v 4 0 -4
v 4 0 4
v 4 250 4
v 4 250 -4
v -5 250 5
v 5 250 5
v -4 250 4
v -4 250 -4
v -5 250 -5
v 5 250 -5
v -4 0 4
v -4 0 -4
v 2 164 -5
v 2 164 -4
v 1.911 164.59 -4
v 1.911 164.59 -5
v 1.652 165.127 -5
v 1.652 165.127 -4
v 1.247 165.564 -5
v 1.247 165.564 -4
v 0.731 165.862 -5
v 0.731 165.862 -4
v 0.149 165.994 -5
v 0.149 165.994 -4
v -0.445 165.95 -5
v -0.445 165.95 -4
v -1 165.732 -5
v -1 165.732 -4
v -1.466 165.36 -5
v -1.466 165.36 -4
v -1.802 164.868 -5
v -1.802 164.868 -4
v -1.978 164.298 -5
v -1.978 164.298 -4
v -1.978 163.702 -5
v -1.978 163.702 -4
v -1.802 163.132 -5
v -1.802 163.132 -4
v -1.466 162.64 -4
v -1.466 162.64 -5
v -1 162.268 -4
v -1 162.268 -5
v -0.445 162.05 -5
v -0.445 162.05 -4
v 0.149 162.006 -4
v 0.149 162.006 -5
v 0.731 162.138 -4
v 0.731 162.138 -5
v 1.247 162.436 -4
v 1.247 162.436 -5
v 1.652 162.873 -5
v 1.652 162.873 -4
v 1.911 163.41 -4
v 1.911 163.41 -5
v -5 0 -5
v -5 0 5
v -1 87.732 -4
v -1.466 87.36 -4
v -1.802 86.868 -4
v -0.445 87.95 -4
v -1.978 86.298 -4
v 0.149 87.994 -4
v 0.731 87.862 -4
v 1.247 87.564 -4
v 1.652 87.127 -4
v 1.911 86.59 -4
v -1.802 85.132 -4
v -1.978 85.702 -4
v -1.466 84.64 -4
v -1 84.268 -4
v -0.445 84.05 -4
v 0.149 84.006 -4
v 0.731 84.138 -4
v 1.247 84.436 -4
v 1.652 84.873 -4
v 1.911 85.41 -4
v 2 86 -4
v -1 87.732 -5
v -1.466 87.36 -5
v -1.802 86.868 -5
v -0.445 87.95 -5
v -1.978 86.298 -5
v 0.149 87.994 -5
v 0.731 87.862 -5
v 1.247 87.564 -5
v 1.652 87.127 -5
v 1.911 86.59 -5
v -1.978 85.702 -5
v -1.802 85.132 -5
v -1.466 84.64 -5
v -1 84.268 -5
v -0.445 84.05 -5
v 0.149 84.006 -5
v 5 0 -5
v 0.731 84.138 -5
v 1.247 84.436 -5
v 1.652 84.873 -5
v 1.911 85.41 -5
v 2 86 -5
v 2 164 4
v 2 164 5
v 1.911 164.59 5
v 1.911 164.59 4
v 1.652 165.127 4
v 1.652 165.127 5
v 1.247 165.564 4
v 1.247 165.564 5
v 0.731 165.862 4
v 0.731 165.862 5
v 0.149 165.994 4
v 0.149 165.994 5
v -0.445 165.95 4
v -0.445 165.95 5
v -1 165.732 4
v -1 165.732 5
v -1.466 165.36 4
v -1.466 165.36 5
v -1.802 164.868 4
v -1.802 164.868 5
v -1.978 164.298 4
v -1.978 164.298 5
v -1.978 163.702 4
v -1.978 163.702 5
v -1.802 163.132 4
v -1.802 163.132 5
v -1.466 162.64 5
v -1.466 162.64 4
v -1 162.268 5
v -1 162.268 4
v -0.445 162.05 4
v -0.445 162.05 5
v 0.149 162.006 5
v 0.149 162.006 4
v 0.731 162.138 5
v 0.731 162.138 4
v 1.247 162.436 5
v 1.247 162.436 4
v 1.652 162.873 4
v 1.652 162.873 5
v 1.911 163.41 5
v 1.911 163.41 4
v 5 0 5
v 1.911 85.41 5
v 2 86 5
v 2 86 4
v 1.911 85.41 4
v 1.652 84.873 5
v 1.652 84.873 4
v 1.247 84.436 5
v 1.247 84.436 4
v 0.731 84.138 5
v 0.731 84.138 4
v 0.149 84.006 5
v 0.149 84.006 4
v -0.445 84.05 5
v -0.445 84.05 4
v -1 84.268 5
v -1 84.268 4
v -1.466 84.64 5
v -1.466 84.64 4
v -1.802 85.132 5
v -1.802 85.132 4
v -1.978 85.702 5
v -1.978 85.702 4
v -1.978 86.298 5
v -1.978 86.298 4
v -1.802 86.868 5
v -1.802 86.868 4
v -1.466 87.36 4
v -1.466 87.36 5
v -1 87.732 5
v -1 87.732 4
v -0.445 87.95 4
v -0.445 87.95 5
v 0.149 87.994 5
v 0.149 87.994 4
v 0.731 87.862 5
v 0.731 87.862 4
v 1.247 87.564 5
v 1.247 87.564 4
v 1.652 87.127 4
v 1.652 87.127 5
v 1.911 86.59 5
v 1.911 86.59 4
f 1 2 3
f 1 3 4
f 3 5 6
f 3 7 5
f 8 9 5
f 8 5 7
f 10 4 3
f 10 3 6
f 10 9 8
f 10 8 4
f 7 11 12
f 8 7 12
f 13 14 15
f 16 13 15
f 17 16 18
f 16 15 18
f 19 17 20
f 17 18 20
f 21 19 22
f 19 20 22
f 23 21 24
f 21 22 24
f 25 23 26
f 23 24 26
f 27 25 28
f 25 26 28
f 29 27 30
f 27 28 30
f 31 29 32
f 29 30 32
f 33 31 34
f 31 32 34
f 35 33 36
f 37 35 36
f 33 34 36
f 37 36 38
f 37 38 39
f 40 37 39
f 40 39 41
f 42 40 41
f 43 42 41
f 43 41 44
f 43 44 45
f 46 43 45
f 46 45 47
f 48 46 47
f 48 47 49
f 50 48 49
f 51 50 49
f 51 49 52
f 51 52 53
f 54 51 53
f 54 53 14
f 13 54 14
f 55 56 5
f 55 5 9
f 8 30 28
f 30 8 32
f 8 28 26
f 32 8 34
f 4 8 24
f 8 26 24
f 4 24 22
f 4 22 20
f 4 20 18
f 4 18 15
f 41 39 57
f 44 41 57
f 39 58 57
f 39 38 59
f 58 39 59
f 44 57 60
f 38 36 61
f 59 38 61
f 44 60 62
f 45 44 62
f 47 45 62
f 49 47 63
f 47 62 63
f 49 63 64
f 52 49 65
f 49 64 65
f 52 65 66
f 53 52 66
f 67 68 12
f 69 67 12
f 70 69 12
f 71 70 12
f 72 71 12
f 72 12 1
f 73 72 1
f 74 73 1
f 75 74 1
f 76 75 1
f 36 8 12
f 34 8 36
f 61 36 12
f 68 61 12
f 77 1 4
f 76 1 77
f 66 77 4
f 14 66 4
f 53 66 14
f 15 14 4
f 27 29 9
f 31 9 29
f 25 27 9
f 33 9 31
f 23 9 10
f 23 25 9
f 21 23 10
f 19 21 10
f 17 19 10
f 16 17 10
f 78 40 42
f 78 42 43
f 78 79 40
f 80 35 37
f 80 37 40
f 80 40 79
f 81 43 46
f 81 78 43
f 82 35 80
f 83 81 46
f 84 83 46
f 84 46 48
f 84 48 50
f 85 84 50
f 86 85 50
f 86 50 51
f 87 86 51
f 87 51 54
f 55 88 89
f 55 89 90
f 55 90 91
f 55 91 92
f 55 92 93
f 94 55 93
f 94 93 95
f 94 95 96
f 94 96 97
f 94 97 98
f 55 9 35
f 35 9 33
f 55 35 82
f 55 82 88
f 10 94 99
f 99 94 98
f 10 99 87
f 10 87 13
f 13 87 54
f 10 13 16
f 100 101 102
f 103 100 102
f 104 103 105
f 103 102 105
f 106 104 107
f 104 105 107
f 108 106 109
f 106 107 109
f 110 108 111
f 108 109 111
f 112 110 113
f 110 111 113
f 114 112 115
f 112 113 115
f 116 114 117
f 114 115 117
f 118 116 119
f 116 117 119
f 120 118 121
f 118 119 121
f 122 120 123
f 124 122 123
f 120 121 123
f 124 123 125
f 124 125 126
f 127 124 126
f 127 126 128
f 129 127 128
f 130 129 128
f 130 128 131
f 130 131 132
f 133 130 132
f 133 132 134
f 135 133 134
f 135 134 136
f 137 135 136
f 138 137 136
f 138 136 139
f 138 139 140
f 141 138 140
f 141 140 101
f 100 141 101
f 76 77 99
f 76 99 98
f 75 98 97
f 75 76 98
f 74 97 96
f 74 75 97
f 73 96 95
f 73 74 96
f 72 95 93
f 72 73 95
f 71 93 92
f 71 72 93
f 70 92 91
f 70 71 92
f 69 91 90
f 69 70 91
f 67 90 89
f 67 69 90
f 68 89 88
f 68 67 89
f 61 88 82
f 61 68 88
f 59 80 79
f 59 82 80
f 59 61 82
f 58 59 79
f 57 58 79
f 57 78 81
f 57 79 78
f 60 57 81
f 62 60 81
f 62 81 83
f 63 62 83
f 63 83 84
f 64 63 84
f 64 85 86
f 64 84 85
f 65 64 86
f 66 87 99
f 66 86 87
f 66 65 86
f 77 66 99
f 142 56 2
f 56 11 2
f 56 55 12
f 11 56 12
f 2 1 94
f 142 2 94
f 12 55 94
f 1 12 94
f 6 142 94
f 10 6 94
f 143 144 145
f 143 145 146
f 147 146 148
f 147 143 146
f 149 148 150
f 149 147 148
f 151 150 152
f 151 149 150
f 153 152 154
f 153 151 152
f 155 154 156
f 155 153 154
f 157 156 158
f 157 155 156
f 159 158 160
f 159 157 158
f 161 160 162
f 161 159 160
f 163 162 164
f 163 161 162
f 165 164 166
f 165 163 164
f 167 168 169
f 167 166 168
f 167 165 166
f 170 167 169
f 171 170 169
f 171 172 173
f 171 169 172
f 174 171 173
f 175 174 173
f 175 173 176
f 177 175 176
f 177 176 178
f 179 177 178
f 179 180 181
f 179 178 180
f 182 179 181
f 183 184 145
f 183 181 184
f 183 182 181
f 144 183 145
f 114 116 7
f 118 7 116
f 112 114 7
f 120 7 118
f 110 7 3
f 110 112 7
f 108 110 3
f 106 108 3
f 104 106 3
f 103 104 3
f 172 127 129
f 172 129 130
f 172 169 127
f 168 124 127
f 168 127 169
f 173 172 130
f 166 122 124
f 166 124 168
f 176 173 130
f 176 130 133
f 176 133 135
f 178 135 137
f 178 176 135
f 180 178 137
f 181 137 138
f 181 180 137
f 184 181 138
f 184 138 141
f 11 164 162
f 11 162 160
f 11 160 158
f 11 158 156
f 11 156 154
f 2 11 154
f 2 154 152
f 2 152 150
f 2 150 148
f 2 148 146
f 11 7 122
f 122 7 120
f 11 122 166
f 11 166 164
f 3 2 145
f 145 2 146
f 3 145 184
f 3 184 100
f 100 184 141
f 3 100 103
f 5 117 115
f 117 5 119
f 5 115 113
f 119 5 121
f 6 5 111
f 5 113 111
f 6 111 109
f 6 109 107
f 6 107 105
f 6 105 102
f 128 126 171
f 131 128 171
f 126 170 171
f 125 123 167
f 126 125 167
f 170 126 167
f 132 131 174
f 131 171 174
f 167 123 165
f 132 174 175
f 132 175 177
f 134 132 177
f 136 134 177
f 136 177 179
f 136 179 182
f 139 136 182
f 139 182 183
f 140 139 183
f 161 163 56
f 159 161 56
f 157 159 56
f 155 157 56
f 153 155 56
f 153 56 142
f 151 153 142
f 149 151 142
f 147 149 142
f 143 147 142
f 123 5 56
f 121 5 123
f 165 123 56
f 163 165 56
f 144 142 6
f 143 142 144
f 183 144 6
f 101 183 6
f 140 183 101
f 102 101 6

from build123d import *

# Parameters (mm, degrees)
SKETCH_1_W            = 10
SKETCH_1_H            = 10
SKETCH_1_W_2          = 8
SKETCH_1_H_2          = 8
EXTRUDE_1_DEPTH       = 250
HOLE_WIZARD_4_0_4_1_D = 4


with BuildPart() as part:
    # 草图1 → 凸台-拉伸1 (new body)
    with BuildSketch(Plane(origin=(0, 0, 0), x_dir=(1, 0, 0), z_dir=(0, 1, 0))):
        Rectangle(SKETCH_1_W, SKETCH_1_H)
        Rectangle(SKETCH_1_W_2, SKETCH_1_H_2, mode=Mode.SUBTRACT)
    extrude(amount=EXTRUDE_1_DEPTH)

    # Ø4.0 (4) 直径孔1 (through all)
    with Locations(Plane(origin=(0, 0, -5), x_dir=(-1, 0, 0), z_dir=(0, 0, -1))):
        with Locations((0, 164)):
            hole_wizard_4_0_4_1 = Hole(HOLE_WIZARD_4_0_4_1_D / 2)

    # 镜向1: Ø4.0 (4) 直径孔1 across plane
    add(hole_wizard_4_0_4_1.mirror(Plane.ZX.offset(125)), mode=Mode.SUBTRACT)


solid = part.part
